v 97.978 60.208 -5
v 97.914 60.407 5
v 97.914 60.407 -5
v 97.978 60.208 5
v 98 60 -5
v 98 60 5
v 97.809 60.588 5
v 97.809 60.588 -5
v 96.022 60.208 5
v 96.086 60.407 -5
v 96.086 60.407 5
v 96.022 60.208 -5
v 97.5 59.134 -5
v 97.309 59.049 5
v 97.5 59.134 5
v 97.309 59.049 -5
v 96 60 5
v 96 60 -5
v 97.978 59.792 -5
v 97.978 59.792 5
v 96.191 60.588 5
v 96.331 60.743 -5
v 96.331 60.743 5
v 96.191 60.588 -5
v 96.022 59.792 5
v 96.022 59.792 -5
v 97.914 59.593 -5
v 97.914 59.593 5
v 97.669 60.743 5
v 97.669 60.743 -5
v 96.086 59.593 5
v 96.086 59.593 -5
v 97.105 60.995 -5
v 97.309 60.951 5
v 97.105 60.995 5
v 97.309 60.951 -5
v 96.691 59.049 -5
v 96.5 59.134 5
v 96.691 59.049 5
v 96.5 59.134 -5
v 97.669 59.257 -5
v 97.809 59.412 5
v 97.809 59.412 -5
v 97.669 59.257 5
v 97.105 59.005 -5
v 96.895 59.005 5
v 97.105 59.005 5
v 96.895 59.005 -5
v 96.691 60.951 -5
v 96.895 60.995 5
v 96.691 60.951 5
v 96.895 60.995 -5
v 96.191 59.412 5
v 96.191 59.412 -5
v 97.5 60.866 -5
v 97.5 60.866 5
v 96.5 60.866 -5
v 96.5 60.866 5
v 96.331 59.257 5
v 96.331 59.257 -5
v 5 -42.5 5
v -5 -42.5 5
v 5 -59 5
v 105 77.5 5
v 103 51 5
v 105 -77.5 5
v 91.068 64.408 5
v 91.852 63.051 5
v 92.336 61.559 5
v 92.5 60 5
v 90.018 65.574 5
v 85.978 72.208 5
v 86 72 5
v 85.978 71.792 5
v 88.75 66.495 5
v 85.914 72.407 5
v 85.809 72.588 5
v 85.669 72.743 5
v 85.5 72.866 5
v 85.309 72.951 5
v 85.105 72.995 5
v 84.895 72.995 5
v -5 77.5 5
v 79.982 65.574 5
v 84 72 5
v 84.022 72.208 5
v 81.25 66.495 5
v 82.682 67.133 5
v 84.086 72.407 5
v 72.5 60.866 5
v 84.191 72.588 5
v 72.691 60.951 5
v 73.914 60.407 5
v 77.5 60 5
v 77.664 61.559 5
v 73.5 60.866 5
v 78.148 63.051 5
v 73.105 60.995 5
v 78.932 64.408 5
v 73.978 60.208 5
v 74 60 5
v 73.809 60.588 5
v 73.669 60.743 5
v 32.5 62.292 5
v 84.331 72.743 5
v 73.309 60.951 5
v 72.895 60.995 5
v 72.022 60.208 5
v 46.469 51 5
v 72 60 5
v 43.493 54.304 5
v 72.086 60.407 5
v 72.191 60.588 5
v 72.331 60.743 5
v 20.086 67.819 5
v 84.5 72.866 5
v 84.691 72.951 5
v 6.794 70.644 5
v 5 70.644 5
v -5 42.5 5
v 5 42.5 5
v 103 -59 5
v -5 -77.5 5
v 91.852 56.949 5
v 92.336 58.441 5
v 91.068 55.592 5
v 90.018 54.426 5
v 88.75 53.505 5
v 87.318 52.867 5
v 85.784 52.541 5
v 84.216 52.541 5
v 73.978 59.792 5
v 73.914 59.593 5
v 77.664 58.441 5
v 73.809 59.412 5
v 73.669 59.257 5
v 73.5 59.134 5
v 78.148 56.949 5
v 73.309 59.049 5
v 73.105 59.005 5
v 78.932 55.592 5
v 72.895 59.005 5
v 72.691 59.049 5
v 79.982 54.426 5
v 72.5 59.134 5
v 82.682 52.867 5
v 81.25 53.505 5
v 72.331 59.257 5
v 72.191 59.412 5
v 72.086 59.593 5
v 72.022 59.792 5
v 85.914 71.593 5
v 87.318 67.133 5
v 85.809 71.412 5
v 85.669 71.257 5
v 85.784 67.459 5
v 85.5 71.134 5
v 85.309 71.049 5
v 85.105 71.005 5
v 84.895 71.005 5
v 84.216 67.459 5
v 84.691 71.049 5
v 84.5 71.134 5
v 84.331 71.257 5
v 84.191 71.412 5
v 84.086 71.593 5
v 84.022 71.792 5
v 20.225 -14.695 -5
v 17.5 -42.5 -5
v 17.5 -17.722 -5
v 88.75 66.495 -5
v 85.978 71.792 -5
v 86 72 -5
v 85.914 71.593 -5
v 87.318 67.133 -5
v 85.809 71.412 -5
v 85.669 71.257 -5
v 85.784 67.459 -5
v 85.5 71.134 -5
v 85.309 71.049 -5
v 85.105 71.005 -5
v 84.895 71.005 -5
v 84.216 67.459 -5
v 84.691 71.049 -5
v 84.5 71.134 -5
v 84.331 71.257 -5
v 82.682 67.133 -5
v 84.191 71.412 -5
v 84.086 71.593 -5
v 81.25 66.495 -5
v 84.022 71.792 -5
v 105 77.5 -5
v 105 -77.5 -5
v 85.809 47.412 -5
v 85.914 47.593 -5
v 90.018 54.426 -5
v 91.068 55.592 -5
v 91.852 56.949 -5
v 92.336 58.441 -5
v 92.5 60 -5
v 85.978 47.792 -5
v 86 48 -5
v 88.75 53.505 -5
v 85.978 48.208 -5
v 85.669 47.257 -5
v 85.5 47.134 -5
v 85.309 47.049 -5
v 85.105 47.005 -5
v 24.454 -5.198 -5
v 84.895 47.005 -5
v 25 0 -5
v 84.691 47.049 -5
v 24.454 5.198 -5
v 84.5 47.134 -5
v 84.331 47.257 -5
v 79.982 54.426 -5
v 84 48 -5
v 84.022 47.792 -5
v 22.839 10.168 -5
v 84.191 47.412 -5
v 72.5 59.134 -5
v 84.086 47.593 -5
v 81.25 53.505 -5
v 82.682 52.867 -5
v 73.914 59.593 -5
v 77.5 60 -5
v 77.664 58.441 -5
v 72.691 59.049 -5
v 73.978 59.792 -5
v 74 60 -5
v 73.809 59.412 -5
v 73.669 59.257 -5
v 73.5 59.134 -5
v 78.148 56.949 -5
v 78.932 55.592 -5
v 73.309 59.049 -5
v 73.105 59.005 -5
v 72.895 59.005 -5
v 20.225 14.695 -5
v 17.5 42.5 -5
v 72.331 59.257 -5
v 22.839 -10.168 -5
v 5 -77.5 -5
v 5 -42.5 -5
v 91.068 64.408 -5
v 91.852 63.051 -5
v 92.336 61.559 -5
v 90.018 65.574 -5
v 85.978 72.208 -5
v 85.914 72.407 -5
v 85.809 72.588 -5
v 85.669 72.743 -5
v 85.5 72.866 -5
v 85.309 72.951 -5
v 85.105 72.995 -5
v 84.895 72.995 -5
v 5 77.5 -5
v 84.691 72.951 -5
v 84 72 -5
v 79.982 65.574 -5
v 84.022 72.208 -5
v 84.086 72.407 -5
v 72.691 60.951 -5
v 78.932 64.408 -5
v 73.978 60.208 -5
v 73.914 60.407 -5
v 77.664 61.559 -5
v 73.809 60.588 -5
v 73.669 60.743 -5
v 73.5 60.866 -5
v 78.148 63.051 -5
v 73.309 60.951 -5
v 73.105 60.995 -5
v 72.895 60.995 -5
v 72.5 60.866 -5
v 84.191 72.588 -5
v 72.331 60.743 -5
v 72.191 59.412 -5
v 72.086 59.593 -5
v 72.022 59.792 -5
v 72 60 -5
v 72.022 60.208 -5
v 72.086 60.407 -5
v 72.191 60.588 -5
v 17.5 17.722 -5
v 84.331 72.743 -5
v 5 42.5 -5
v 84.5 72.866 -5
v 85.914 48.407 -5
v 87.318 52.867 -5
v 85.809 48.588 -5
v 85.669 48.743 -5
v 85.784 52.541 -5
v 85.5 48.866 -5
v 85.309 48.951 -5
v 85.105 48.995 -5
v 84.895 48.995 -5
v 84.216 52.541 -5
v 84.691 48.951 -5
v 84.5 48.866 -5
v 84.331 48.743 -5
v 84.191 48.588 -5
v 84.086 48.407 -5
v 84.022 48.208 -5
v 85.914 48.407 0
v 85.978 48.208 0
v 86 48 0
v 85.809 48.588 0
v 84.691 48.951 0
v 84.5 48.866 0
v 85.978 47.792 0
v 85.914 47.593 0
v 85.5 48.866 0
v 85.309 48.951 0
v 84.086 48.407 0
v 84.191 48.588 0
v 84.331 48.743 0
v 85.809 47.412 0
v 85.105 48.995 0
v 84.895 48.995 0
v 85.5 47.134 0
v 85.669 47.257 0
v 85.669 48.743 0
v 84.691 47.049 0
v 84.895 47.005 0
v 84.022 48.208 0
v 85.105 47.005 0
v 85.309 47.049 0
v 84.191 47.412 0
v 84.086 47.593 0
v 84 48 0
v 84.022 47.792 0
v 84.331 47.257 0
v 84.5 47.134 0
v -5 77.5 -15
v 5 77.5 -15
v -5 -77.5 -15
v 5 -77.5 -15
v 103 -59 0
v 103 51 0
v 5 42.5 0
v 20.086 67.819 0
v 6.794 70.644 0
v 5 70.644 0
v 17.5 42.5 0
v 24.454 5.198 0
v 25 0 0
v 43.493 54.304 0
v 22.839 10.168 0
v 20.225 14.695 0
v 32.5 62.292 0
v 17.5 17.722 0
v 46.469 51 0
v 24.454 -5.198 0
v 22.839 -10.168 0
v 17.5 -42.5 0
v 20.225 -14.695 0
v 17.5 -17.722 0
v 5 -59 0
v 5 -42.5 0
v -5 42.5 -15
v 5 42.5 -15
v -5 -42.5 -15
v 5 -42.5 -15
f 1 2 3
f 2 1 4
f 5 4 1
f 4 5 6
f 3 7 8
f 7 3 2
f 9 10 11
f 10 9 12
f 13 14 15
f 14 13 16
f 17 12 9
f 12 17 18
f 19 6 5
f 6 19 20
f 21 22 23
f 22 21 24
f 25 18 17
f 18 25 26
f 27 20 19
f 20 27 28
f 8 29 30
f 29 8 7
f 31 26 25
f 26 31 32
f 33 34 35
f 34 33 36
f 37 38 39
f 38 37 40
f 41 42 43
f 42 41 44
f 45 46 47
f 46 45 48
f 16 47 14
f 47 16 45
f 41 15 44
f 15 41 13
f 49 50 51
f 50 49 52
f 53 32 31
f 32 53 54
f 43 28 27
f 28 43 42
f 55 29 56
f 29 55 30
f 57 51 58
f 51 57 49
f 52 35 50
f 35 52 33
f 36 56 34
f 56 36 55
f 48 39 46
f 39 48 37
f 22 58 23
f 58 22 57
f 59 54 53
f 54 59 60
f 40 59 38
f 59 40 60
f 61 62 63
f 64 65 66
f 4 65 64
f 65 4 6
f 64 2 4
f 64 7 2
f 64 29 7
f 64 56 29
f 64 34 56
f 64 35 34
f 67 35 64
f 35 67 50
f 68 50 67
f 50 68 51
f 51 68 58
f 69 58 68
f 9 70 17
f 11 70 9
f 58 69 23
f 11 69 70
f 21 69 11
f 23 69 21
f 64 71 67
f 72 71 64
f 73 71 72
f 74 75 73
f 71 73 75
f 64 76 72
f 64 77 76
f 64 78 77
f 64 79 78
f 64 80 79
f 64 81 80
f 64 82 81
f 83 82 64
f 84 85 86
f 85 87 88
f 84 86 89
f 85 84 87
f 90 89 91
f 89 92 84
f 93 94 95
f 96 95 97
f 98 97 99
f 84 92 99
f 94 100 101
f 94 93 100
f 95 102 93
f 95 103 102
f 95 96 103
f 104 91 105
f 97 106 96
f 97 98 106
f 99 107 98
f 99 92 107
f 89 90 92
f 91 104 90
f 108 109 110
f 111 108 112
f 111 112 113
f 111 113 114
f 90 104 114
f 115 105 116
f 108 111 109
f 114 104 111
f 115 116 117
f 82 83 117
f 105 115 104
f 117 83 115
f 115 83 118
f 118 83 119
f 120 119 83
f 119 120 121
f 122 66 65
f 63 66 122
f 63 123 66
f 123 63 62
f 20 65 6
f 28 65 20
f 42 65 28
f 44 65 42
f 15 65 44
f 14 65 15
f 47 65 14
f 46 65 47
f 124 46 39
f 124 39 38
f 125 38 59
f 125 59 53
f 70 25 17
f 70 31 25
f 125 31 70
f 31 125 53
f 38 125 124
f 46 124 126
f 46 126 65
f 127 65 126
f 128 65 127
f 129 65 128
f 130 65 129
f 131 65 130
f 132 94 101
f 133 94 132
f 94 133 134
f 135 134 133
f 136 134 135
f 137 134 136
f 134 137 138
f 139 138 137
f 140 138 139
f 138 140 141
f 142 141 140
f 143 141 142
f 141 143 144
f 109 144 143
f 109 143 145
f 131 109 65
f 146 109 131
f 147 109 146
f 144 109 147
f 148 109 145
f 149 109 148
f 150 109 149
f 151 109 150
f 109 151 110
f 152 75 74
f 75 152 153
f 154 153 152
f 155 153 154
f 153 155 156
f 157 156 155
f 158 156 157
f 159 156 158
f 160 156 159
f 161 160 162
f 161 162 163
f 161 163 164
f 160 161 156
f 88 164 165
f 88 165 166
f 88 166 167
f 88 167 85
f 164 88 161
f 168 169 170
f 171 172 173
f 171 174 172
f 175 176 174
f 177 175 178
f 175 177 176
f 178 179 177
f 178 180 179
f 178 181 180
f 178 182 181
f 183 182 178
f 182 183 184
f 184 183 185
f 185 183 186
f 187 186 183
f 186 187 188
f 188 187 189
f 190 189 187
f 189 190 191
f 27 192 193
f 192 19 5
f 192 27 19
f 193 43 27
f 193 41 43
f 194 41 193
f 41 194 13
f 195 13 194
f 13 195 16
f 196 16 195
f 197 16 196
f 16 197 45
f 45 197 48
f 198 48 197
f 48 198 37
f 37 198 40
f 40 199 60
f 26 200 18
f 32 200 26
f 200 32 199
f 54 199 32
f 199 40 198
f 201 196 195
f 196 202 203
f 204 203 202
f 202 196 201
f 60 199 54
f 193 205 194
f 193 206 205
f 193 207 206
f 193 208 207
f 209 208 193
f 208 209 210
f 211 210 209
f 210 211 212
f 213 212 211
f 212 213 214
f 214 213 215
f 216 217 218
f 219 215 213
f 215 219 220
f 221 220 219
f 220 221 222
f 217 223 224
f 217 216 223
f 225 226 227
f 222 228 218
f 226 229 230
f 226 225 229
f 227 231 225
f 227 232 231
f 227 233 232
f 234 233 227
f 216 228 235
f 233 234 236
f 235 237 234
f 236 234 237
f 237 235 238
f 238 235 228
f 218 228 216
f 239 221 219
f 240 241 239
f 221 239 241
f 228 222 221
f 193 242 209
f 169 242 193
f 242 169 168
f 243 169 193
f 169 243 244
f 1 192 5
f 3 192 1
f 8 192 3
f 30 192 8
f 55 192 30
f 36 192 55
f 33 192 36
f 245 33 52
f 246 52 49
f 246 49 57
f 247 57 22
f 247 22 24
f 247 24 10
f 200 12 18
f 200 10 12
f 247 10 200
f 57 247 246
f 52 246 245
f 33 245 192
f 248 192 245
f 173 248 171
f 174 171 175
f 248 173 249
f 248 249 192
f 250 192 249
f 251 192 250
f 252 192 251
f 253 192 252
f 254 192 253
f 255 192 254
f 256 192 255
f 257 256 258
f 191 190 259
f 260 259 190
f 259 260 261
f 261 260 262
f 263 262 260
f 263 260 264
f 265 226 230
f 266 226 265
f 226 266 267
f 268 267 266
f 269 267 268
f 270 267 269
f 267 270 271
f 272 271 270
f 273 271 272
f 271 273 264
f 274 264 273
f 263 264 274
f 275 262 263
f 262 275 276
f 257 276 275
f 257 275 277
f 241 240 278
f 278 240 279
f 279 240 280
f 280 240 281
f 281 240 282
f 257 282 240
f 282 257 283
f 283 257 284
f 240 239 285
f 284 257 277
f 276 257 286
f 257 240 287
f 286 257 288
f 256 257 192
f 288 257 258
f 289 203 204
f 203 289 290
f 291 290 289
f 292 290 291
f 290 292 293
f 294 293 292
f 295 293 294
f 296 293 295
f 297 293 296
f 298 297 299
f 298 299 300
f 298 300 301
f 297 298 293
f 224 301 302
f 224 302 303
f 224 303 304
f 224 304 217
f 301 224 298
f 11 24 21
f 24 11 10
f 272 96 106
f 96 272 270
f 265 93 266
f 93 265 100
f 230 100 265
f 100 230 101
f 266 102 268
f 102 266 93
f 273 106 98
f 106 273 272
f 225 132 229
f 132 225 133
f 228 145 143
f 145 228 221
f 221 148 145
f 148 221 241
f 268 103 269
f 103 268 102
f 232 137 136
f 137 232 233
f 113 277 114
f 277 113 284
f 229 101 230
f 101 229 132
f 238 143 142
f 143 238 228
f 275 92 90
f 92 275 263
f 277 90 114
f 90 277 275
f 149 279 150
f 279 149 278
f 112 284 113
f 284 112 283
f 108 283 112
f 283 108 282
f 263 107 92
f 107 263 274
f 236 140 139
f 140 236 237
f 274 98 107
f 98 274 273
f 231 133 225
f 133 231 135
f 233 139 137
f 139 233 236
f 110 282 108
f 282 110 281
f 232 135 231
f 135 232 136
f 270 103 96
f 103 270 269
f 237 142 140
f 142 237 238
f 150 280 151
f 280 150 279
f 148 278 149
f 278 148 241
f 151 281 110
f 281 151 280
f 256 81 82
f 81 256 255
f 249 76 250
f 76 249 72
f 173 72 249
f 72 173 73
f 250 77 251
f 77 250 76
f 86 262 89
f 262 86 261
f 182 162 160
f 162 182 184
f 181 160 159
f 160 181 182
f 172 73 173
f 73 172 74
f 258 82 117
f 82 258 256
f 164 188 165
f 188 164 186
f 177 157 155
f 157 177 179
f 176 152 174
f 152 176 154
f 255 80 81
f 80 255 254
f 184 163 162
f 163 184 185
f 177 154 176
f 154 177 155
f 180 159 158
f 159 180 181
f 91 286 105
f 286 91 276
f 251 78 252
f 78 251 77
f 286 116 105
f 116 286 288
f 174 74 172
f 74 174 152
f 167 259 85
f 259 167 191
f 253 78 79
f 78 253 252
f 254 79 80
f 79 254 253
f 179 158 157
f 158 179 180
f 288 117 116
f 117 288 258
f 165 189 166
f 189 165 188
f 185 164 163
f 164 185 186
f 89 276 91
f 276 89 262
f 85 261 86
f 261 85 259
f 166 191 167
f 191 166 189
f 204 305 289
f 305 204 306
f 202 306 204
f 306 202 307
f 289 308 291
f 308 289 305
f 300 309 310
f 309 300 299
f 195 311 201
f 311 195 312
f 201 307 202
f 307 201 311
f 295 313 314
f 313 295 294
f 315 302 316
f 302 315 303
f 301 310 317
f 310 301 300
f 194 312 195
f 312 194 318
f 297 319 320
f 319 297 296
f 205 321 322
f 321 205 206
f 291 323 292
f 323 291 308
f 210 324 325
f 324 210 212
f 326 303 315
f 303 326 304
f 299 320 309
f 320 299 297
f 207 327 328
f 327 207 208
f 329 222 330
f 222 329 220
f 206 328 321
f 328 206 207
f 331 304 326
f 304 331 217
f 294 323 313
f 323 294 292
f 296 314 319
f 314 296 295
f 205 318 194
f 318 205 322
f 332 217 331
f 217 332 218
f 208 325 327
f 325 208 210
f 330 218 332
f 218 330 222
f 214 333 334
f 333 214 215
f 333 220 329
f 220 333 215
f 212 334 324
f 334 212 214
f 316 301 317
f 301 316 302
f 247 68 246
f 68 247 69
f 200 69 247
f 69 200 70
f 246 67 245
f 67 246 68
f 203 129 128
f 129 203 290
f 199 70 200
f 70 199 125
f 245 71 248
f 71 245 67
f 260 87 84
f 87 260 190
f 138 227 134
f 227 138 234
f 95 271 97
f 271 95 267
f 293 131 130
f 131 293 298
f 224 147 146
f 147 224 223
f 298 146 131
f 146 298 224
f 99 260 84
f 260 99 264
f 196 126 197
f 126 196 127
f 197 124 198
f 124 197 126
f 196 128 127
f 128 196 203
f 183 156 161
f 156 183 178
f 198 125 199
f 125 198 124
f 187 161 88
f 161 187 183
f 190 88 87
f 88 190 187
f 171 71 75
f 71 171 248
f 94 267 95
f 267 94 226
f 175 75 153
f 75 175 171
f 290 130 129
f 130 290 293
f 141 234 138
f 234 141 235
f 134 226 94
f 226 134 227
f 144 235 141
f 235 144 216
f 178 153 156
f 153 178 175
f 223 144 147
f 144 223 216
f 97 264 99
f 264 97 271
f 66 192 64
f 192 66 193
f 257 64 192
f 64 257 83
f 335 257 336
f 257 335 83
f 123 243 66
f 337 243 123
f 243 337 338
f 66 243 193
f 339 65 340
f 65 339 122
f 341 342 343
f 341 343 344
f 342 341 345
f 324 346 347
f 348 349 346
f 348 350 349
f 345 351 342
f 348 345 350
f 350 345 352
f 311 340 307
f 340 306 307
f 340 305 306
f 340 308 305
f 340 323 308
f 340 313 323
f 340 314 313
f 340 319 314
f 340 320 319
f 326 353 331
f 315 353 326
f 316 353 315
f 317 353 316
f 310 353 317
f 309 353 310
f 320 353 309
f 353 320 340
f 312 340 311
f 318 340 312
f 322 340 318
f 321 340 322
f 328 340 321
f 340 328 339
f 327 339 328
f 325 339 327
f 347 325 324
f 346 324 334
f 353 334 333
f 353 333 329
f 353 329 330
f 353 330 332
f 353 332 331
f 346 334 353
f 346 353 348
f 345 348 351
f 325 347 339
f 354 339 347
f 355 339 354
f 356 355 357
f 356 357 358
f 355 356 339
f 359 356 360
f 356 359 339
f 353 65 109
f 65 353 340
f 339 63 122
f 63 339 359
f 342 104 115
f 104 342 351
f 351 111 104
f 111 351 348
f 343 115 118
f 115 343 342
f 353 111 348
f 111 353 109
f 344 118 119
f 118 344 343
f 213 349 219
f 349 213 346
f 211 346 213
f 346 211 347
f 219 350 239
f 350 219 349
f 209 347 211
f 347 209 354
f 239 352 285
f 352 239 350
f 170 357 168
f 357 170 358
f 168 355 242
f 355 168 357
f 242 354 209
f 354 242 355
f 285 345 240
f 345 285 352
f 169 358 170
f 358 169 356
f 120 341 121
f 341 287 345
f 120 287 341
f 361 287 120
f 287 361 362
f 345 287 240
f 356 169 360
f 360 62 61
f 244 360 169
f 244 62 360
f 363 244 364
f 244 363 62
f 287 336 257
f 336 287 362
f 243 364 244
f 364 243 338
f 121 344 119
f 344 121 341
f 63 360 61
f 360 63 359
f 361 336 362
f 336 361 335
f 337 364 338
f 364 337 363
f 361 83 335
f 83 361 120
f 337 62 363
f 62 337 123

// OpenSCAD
// Multi_Tissue_Recording Stage v1
// Jack F. Murphy <me@jackmurphy.nyc>
// https://github.com/teammurphy/Multi_Tissue_CAD

// Smoothness
$fn = 30;

// Stage Dimensions
stage_len=210;
stage_width=155;
stage_thickness=10;

// Hole Dimensions
hole_diam=50;
hole_len=85;
hole_width=35;
lin_bearing=15;
threaded=10;
pilot_rad=2;

difference(){
  translate([0, 0, 0])  
    cube([stage_len, stage_width, stage_thickness], center=true);
    
  translate([0, -4, 5]) 
    cube([stage_len-4, stage_width-45, stage_thickness], center=true);
  
  translate([0, 6, 5])
    cylinder(d=130, h=stage_thickness, center=true);  
  // Circular Gap
  translate([0, 0, 0])
    cylinder(d=hole_diam, h=stage_thickness, center=true);

  // Rectangular Gap
  cube([hole_width, hole_len, stage_thickness], center=true);


  translate([85, 60, 0]) {
    cylinder(d=lin_bearing, h=stage_thickness, center=true);
    pilot_holes(12);
  }
  // Cut out left side
  translate([-stage_len/4, 0, 0])
    cube([stage_len/2, stage_width, stage_thickness], center=true); 
}

difference(){
    translate([0, 0, -stage_thickness/2])
        cube([10, stage_width, 2*stage_thickness], center=true);
     cube([hole_width, hole_len, 3*stage_thickness], center=true);
}

// Create 4 pilot holes evenly spaced around the hole.
module pilot_holes(radius){
  translate([radius, 0, 0])
    cylinder(d=pilot_rad, h=stage_thickness, center=true);
  translate([-1*radius, 0, 0])
    cylinder(d=pilot_rad, h=stage_thickness, center=true);
  translate([0, radius, 0])
    cylinder(d=pilot_rad, h=stage_thickness, center=true);
  translate([0, -1*radius, 0])
    cylinder(d=pilot_rad, h=stage_thickness, center=true);
}
